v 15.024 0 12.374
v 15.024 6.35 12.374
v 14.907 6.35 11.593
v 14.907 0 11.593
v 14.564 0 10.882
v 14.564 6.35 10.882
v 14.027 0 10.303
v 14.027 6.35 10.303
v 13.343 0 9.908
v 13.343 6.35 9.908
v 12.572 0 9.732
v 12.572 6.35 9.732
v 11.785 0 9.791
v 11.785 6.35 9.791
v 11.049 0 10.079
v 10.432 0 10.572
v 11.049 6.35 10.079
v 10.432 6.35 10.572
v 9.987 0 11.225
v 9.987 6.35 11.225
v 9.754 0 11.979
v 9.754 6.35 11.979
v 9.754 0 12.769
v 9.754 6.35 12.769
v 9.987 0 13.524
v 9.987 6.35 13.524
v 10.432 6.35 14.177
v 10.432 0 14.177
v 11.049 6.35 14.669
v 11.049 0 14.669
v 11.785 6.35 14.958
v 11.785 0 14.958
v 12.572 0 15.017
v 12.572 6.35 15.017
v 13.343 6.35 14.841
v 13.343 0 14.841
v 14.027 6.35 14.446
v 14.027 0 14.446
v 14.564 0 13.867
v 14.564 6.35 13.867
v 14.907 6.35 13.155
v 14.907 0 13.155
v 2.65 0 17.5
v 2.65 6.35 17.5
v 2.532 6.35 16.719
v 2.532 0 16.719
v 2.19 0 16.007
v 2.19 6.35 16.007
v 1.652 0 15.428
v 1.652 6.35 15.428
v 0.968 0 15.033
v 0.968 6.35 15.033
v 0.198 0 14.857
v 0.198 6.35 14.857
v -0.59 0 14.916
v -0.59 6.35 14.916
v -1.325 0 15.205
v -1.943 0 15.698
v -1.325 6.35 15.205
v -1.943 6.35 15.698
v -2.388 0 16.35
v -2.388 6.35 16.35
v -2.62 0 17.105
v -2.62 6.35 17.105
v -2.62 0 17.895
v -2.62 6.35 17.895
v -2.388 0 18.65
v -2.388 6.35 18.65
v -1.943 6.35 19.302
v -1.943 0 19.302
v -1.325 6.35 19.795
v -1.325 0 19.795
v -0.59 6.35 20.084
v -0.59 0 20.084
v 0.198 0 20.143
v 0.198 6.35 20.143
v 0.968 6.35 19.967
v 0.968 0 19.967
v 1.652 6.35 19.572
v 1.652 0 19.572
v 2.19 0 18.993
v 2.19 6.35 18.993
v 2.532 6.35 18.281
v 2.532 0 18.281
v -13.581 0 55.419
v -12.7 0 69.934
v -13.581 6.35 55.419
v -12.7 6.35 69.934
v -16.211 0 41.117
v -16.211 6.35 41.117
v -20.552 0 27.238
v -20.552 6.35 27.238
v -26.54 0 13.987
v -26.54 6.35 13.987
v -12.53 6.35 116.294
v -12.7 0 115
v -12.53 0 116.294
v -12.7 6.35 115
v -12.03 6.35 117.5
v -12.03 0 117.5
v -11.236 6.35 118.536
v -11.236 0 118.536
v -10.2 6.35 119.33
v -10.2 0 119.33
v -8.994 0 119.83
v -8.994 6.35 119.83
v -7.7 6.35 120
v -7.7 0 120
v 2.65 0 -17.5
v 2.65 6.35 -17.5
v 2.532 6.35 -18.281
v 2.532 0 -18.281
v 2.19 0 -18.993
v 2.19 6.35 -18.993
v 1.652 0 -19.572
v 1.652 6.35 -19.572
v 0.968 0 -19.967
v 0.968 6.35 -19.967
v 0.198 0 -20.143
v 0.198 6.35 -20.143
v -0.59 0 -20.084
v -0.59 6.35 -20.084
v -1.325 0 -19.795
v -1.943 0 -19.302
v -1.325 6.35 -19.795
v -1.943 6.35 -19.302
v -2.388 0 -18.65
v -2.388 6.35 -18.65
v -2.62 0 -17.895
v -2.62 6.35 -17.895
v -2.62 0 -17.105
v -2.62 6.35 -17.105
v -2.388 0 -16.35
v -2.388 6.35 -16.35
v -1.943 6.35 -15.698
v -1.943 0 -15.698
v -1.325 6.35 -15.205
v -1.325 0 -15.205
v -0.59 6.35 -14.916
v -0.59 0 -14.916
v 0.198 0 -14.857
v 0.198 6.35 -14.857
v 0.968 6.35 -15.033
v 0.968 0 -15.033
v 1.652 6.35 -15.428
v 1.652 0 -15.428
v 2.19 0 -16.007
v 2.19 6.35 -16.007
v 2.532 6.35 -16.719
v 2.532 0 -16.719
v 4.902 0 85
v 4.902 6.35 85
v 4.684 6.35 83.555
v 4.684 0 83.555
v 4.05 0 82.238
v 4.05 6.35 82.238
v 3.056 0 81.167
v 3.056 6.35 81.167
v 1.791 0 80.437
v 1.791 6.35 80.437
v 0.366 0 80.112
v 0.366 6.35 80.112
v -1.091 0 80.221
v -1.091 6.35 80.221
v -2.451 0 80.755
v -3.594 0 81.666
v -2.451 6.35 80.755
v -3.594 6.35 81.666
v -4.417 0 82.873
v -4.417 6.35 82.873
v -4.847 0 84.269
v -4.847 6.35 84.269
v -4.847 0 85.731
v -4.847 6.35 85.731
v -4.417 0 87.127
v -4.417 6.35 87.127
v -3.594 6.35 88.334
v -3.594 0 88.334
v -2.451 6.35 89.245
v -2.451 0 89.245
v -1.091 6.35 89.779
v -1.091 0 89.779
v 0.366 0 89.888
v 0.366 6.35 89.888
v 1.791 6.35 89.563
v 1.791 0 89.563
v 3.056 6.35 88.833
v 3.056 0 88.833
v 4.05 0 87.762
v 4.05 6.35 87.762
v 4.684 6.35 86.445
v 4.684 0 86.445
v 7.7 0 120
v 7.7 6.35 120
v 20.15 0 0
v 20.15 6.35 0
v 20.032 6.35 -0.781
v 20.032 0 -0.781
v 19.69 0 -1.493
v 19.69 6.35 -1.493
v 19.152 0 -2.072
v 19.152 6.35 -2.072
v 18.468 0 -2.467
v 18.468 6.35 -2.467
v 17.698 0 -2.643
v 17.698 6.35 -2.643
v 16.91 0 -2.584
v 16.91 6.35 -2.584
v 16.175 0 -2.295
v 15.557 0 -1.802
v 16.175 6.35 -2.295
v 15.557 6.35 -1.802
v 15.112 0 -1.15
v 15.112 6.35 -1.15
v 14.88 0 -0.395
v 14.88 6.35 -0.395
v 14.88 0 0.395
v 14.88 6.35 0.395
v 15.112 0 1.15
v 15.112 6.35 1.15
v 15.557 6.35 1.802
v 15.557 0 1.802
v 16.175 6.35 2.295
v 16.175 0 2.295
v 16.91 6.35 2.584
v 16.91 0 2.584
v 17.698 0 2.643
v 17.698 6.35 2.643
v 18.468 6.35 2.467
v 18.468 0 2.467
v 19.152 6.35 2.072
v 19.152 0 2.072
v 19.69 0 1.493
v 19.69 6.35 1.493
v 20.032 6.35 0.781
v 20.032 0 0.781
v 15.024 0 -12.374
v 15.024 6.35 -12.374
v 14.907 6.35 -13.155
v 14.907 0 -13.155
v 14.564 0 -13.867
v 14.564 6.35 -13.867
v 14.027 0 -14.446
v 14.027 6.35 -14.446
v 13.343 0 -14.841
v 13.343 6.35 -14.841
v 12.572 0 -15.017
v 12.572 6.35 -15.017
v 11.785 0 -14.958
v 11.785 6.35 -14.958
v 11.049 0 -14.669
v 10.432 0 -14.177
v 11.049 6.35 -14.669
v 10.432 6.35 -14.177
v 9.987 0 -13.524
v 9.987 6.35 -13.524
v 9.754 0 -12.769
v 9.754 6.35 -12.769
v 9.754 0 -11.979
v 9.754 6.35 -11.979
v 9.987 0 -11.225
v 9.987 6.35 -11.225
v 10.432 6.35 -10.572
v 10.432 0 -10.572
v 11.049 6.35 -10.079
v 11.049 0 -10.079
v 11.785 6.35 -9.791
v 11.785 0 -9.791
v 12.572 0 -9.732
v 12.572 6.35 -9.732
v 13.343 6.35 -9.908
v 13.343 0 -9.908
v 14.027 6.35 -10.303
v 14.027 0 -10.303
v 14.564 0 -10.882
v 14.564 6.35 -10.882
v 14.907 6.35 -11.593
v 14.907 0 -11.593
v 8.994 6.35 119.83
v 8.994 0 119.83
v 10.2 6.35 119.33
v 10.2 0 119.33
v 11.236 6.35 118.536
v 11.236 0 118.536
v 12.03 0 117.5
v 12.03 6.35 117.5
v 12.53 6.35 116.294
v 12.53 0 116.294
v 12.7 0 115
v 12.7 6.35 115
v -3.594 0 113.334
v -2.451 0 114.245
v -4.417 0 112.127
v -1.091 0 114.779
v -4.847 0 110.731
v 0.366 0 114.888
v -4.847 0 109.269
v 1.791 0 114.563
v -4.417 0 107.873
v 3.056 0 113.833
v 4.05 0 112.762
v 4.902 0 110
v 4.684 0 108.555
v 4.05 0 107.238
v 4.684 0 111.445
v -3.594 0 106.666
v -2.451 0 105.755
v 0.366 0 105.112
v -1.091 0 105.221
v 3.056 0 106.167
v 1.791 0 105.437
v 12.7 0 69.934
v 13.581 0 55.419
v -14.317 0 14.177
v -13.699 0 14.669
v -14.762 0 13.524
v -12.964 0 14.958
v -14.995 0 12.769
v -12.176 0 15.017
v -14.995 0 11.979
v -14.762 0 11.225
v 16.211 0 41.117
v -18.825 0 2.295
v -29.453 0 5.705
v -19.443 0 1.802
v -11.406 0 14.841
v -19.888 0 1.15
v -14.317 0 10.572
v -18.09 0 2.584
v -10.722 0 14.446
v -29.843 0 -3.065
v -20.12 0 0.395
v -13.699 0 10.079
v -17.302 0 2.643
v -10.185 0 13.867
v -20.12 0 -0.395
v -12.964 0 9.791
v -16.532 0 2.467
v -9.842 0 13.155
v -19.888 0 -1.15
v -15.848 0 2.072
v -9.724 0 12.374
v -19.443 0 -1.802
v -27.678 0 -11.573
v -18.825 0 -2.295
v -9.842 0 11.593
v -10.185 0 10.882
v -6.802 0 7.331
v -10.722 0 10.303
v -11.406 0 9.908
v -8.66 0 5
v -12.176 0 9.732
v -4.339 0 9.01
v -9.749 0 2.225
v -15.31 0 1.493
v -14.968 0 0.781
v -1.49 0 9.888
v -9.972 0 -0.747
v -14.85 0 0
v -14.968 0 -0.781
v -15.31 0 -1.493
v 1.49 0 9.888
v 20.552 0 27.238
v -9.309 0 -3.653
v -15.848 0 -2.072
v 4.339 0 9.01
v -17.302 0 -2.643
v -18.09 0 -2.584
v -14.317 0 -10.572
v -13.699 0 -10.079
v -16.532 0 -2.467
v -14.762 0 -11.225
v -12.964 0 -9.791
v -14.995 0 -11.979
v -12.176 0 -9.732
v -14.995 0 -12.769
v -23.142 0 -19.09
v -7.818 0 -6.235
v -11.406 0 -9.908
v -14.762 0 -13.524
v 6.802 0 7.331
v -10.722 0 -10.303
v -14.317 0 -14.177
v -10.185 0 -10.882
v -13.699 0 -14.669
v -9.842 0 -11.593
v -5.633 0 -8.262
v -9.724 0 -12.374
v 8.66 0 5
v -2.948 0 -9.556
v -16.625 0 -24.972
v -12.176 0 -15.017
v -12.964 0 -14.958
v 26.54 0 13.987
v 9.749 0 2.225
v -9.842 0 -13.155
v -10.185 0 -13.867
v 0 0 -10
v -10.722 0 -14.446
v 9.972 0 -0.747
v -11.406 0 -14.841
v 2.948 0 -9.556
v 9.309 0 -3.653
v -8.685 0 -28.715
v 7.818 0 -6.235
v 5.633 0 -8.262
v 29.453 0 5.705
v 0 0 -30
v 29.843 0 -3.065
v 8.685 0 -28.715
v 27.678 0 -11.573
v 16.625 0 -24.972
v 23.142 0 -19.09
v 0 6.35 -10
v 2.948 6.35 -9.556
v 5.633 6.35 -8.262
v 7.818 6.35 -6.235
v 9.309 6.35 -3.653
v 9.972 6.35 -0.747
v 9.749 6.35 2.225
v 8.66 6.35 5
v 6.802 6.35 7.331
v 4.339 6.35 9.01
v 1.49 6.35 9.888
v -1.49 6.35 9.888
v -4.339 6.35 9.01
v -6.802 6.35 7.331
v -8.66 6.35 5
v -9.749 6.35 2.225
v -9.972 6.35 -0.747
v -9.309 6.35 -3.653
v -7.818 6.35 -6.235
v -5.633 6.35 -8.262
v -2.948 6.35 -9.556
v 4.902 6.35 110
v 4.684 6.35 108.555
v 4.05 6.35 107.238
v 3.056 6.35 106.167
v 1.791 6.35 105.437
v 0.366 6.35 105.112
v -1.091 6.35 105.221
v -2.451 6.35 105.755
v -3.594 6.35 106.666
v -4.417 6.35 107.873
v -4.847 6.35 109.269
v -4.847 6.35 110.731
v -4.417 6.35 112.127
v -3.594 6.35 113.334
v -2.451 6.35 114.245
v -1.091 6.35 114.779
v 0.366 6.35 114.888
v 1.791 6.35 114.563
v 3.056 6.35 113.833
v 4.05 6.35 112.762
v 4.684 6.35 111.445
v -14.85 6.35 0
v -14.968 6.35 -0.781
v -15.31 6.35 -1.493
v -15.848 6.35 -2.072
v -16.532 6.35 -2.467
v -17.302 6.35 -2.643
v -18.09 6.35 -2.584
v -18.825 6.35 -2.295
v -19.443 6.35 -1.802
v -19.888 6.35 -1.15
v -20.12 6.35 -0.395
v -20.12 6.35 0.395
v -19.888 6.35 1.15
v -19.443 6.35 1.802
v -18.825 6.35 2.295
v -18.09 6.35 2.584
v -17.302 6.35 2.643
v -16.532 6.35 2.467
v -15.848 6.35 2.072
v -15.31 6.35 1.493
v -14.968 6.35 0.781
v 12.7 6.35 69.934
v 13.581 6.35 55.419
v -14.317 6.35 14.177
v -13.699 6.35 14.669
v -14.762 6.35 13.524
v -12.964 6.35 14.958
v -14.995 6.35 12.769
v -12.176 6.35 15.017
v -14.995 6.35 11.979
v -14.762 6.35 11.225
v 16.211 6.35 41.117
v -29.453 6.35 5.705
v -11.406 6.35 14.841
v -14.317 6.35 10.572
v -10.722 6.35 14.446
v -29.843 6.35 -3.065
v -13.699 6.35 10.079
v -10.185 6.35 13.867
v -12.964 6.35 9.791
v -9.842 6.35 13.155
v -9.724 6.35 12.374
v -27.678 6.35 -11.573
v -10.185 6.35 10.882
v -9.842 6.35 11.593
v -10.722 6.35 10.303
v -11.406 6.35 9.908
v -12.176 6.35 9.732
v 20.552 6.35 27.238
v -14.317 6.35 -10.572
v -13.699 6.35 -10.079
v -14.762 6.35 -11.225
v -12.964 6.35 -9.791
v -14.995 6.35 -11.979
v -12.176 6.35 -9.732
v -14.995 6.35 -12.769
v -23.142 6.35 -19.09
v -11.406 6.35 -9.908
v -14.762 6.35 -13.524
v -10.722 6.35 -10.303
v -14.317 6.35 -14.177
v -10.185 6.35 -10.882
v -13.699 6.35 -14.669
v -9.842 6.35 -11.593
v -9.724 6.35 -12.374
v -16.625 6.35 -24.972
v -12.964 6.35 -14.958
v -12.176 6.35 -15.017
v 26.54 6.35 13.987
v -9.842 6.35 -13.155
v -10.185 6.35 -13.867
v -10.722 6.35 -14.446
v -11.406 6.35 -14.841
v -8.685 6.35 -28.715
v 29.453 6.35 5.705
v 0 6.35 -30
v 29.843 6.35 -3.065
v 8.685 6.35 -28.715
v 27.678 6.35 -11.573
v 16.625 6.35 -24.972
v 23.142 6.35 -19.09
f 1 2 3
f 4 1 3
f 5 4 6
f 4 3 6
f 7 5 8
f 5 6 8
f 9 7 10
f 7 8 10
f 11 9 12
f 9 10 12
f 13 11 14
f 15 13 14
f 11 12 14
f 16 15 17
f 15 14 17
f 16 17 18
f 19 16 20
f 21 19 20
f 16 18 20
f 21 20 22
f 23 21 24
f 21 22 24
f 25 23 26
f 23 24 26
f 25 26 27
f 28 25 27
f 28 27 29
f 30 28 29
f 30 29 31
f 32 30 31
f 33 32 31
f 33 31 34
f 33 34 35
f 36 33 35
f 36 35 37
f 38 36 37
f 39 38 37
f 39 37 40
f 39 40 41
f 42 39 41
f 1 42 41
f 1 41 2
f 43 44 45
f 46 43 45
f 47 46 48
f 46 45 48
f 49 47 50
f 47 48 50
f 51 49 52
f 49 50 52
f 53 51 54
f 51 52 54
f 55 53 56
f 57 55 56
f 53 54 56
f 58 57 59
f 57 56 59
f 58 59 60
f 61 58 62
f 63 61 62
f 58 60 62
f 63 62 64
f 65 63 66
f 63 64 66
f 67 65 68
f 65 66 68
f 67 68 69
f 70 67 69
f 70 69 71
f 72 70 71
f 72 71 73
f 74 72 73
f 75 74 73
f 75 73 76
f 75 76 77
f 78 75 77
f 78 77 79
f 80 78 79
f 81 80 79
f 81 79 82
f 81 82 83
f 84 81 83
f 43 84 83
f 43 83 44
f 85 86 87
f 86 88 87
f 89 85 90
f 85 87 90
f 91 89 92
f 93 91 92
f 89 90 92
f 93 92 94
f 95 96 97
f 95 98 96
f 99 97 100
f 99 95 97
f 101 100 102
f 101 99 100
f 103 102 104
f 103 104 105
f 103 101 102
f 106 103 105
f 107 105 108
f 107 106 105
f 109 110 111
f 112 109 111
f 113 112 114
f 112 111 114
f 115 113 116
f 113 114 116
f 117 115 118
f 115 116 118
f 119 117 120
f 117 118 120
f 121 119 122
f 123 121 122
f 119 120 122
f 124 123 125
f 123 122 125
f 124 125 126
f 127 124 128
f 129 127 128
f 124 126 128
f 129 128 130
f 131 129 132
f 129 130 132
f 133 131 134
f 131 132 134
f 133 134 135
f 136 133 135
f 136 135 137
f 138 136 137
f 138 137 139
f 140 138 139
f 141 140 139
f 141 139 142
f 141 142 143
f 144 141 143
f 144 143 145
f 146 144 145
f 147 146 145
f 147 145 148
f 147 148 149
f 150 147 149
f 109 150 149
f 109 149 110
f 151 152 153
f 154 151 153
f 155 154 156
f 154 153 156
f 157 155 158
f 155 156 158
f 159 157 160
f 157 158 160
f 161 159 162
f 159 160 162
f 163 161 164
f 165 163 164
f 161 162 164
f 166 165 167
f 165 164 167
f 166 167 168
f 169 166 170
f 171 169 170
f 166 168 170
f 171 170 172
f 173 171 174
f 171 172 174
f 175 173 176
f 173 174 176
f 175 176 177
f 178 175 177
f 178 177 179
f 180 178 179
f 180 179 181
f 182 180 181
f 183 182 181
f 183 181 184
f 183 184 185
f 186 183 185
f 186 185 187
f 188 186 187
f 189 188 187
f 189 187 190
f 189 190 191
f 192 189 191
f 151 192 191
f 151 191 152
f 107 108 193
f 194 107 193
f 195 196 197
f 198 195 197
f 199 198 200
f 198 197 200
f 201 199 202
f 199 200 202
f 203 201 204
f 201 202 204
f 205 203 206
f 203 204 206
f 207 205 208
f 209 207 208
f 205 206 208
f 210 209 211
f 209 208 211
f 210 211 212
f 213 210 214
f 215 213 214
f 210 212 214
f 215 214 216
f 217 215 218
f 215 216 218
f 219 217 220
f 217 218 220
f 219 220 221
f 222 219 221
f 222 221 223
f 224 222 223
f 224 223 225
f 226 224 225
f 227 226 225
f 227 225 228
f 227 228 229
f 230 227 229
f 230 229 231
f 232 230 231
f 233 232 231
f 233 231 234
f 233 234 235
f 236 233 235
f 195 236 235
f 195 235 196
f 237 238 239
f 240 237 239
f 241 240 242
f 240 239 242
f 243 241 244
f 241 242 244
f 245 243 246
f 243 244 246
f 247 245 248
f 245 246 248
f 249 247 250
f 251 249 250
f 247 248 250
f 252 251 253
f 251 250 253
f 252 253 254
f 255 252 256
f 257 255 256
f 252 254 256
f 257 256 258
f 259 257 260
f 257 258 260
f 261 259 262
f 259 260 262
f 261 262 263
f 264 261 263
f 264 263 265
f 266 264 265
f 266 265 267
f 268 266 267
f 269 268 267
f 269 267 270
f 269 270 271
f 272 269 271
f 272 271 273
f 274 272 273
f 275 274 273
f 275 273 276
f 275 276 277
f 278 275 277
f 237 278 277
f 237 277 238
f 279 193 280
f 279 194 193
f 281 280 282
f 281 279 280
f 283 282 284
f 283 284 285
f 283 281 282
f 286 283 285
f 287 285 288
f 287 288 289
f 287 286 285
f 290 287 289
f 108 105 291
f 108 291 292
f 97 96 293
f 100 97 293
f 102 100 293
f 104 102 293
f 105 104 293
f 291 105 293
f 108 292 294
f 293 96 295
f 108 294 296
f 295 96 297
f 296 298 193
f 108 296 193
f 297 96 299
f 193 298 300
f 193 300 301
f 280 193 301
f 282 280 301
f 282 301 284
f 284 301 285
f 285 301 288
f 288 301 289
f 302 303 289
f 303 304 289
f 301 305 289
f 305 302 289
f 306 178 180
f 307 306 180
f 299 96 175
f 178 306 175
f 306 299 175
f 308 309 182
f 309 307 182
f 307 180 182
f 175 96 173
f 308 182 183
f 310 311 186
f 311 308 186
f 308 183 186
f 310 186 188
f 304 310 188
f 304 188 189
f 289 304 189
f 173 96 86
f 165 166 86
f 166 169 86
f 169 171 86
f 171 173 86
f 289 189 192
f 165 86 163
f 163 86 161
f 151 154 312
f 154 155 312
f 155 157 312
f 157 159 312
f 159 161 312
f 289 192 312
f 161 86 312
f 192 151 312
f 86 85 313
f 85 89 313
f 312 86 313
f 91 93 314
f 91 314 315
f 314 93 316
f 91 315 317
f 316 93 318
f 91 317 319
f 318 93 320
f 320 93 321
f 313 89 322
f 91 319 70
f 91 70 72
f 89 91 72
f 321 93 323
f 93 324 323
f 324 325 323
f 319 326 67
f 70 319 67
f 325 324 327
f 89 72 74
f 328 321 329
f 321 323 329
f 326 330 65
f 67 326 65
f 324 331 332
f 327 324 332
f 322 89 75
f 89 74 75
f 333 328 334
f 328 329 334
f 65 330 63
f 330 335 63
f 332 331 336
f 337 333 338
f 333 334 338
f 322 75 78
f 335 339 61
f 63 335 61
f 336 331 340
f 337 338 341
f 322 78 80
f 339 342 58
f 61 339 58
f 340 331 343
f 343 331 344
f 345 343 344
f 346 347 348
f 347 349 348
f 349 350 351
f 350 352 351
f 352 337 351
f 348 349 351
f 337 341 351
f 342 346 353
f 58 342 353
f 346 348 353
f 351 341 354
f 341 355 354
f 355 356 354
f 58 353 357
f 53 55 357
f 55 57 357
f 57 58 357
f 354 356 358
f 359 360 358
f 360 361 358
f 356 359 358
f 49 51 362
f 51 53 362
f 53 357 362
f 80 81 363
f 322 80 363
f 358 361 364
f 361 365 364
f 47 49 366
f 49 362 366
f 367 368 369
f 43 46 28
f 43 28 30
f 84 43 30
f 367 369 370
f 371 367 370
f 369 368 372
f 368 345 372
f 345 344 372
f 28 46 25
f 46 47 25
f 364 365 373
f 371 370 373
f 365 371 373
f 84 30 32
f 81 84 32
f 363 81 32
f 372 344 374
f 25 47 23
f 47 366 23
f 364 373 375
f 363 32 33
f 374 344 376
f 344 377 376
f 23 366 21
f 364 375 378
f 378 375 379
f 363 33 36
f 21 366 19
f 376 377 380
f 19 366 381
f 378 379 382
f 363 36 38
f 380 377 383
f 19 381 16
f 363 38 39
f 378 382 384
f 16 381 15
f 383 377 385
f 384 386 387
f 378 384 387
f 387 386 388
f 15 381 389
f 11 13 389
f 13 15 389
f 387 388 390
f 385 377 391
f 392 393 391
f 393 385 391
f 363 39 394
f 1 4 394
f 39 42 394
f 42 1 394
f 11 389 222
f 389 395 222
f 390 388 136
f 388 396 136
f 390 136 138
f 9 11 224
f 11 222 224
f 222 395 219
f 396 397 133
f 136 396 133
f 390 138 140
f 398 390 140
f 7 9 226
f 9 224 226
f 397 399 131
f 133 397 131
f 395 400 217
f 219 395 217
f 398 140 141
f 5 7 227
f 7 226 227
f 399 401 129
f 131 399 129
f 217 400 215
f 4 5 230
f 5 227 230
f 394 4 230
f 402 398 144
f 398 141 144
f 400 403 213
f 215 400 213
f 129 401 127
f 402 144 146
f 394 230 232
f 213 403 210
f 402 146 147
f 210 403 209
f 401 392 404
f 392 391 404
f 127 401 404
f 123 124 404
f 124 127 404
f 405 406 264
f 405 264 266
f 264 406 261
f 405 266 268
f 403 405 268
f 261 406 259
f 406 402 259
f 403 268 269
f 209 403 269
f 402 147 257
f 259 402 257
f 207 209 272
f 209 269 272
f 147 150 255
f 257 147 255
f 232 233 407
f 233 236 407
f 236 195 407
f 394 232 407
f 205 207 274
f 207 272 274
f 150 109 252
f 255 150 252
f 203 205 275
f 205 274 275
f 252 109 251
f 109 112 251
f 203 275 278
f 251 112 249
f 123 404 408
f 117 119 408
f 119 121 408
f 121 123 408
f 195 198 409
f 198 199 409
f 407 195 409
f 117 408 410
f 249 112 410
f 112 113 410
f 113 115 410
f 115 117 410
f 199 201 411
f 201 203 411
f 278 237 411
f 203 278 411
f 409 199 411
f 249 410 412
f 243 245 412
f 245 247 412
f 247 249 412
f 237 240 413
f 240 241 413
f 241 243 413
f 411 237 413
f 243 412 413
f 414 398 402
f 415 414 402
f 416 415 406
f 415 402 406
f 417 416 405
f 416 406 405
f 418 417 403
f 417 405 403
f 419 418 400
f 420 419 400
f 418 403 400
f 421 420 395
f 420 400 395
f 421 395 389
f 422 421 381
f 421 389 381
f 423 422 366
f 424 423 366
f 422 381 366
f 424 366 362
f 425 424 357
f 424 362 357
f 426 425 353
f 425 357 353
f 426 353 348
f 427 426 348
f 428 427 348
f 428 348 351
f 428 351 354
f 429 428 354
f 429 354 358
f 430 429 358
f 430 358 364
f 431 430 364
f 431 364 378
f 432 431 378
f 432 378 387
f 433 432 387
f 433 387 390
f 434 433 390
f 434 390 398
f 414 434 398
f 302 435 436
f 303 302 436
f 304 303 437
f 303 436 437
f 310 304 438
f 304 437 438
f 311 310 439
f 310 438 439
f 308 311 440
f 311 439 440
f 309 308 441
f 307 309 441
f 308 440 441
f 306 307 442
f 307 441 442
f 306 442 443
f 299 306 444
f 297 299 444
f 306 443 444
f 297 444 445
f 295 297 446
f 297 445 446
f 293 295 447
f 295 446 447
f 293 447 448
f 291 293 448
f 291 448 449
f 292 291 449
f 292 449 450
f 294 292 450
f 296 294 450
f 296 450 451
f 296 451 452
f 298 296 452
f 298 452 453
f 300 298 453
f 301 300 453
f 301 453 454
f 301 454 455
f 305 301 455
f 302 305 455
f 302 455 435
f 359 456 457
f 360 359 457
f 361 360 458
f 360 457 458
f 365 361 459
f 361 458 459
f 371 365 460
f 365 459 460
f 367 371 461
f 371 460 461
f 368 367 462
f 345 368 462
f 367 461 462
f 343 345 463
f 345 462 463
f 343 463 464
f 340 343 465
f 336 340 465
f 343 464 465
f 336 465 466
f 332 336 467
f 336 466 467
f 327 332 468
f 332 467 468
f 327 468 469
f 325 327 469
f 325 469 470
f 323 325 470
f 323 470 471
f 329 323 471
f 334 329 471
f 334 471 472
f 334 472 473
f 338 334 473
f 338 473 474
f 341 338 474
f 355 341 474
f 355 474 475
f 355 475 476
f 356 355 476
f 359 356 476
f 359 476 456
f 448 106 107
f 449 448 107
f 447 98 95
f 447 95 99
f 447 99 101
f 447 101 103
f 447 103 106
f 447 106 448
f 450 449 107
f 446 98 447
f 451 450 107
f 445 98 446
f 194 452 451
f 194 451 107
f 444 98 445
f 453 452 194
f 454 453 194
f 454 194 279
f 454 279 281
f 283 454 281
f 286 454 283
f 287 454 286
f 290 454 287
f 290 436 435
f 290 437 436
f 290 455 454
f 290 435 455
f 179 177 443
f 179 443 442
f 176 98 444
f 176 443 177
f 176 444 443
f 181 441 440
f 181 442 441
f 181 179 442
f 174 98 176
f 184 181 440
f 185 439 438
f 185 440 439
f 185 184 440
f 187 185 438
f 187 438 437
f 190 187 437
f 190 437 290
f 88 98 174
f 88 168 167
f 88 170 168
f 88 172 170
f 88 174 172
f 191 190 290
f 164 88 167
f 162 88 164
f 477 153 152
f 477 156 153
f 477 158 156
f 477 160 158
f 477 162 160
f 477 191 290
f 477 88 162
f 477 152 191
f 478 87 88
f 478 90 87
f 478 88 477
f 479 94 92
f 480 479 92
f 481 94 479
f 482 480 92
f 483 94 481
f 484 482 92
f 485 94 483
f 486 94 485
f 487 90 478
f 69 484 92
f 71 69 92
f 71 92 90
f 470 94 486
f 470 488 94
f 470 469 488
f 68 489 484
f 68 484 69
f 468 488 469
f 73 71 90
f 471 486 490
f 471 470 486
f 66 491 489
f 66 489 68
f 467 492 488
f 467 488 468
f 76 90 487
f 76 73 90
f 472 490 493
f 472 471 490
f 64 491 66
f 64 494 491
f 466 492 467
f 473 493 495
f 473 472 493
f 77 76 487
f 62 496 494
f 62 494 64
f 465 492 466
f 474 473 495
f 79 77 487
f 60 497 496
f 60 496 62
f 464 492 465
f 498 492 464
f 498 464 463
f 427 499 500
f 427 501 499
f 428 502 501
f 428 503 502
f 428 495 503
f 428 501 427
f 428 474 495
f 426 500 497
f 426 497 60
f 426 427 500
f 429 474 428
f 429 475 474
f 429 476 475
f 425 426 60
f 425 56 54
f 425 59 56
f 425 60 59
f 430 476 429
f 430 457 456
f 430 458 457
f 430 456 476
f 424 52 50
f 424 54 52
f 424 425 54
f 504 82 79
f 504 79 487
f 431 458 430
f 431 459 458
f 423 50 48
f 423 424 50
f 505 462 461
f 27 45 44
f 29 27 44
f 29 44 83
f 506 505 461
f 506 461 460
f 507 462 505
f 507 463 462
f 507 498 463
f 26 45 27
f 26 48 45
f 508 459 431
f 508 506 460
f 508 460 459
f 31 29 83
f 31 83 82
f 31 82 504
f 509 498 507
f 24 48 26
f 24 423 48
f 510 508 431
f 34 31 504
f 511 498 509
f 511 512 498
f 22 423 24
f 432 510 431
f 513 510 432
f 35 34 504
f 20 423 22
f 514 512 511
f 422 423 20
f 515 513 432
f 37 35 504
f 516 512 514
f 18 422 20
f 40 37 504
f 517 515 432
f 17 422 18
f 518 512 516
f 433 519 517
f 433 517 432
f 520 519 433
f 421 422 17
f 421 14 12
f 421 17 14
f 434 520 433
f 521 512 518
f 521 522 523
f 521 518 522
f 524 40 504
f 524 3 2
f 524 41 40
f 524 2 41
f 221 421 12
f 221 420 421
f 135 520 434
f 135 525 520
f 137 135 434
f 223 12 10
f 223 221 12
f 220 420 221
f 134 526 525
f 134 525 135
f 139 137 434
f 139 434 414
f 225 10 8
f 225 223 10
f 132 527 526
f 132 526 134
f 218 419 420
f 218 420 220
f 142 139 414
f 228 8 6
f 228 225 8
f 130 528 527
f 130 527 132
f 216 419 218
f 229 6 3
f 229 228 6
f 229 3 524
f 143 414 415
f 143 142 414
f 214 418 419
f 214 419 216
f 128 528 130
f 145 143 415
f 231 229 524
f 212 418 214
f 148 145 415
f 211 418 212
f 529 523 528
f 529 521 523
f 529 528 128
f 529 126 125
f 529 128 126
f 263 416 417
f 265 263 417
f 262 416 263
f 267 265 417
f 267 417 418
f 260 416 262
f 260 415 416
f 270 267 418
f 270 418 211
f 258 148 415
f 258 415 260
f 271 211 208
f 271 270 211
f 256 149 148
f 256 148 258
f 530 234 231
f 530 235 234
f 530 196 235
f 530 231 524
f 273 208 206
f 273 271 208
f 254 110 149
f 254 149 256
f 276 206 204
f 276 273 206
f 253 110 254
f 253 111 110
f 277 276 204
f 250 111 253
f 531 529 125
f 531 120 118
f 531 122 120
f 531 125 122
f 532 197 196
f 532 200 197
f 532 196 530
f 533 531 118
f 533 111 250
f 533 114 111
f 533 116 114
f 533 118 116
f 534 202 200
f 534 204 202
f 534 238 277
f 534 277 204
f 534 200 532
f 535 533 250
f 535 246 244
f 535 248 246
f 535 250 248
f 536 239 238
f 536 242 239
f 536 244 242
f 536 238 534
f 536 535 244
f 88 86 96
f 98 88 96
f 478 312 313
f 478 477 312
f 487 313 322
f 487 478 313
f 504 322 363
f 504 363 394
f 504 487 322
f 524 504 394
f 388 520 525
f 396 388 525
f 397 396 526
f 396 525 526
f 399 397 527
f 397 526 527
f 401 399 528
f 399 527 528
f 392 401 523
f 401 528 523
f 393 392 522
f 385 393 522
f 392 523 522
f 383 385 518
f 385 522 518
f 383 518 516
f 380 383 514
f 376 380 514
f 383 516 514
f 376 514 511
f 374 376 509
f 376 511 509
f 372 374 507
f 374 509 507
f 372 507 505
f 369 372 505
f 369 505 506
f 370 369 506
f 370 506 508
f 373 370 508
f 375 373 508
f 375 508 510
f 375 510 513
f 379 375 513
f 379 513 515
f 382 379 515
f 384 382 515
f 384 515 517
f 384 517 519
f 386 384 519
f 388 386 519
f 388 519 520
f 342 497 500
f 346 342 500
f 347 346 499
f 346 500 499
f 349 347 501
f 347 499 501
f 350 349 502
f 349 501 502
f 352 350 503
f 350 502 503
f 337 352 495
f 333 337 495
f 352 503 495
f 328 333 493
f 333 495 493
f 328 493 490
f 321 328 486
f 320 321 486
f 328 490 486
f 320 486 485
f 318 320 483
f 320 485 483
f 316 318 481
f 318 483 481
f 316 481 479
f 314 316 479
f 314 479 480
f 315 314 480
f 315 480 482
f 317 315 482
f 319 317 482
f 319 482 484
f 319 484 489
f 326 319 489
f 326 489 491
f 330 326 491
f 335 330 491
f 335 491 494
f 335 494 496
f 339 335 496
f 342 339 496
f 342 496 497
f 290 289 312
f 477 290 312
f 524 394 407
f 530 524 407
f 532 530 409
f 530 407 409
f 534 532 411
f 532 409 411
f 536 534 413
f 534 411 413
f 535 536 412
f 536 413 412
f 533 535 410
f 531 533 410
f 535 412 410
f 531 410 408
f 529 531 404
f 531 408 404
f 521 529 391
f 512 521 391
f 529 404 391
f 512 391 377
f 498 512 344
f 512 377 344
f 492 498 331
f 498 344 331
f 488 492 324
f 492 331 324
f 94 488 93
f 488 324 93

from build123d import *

# Parameters (mm, degrees)
BOSS_EXTRUDE1_DEPTH     = 6.35
M5_CLEARANCE_HOLE1_D    = 5.3
SKETCH5_R               = 10
CUT_EXTRUDE1_DEPTH      = 124.856055565
F_3_8_CLEARANCE_HOLE1_D = 9.8044
FILLET1_R               = 120
FILLET2_R               = 5


with BuildPart() as part:
    # Sketch1 → Boss-Extrude1 (new body)
    with BuildSketch(Plane(origin=(0, 0, 0), x_dir=(1, 0, 0), z_dir=(0, 1, 0))):
        with BuildLine():
            Line((-12.7, -120), (12.7, -120))
            Line((12.7, -120), (12.7, -27.179220004))
            ThreePointArc((12.7, -27.179220004), (0, 30), (-12.7, -27.179220004))
            Line((-12.7, -27.179220004), (-12.7, -120))
        make_face()
    extrude(amount=BOSS_EXTRUDE1_DEPTH)

    # M5 Clearance Hole1 (through all)
    with Locations(Plane(origin=(0, 0, 0), x_dir=(-1, 0, 0), z_dir=(0, -1, 0))):
        with Locations((0, 17.5), (12.374368671, 12.374368671), (17.5, 0), (12.374368671, -12.374368671), (0, -17.5), (-12.374368671, -12.374368671), (-17.5, 0), (-12.374368671, 12.374368671)):
            Hole(M5_CLEARANCE_HOLE1_D / 2)

    # Sketch5 → Cut-Extrude1 (cut, through all)
    with BuildSketch(Plane.XZ):
        Circle(SKETCH5_R)
    extrude(amount=-CUT_EXTRUDE1_DEPTH, mode=Mode.SUBTRACT)

    # 3/8 Clearance Hole1 (through all)
    with Locations(Plane(origin=(0, 0, 0), x_dir=(-1, 0, 0), z_dir=(0, -1, 0))):
        with Locations((0, -85), (0, -110)):
            Hole(F_3_8_CLEARANCE_HOLE1_D / 2)

    # Fillet1
    fillet1_edges = [part.edges().sort_by_distance(p)[0] for p in [
        (-12.7, 3.175, 27.179220004),
        (12.7, 3.175, 27.179220004),
    ]]
    fillet(fillet1_edges, radius=FILLET1_R)

    # Fillet2
    fillet2_edges = [part.edges().sort_by_distance(p)[0] for p in [
        (12.7, 3.175, 120),
        (-12.7, 3.175, 120),
    ]]
    fillet(fillet2_edges, radius=FILLET2_R)


solid = part.part
